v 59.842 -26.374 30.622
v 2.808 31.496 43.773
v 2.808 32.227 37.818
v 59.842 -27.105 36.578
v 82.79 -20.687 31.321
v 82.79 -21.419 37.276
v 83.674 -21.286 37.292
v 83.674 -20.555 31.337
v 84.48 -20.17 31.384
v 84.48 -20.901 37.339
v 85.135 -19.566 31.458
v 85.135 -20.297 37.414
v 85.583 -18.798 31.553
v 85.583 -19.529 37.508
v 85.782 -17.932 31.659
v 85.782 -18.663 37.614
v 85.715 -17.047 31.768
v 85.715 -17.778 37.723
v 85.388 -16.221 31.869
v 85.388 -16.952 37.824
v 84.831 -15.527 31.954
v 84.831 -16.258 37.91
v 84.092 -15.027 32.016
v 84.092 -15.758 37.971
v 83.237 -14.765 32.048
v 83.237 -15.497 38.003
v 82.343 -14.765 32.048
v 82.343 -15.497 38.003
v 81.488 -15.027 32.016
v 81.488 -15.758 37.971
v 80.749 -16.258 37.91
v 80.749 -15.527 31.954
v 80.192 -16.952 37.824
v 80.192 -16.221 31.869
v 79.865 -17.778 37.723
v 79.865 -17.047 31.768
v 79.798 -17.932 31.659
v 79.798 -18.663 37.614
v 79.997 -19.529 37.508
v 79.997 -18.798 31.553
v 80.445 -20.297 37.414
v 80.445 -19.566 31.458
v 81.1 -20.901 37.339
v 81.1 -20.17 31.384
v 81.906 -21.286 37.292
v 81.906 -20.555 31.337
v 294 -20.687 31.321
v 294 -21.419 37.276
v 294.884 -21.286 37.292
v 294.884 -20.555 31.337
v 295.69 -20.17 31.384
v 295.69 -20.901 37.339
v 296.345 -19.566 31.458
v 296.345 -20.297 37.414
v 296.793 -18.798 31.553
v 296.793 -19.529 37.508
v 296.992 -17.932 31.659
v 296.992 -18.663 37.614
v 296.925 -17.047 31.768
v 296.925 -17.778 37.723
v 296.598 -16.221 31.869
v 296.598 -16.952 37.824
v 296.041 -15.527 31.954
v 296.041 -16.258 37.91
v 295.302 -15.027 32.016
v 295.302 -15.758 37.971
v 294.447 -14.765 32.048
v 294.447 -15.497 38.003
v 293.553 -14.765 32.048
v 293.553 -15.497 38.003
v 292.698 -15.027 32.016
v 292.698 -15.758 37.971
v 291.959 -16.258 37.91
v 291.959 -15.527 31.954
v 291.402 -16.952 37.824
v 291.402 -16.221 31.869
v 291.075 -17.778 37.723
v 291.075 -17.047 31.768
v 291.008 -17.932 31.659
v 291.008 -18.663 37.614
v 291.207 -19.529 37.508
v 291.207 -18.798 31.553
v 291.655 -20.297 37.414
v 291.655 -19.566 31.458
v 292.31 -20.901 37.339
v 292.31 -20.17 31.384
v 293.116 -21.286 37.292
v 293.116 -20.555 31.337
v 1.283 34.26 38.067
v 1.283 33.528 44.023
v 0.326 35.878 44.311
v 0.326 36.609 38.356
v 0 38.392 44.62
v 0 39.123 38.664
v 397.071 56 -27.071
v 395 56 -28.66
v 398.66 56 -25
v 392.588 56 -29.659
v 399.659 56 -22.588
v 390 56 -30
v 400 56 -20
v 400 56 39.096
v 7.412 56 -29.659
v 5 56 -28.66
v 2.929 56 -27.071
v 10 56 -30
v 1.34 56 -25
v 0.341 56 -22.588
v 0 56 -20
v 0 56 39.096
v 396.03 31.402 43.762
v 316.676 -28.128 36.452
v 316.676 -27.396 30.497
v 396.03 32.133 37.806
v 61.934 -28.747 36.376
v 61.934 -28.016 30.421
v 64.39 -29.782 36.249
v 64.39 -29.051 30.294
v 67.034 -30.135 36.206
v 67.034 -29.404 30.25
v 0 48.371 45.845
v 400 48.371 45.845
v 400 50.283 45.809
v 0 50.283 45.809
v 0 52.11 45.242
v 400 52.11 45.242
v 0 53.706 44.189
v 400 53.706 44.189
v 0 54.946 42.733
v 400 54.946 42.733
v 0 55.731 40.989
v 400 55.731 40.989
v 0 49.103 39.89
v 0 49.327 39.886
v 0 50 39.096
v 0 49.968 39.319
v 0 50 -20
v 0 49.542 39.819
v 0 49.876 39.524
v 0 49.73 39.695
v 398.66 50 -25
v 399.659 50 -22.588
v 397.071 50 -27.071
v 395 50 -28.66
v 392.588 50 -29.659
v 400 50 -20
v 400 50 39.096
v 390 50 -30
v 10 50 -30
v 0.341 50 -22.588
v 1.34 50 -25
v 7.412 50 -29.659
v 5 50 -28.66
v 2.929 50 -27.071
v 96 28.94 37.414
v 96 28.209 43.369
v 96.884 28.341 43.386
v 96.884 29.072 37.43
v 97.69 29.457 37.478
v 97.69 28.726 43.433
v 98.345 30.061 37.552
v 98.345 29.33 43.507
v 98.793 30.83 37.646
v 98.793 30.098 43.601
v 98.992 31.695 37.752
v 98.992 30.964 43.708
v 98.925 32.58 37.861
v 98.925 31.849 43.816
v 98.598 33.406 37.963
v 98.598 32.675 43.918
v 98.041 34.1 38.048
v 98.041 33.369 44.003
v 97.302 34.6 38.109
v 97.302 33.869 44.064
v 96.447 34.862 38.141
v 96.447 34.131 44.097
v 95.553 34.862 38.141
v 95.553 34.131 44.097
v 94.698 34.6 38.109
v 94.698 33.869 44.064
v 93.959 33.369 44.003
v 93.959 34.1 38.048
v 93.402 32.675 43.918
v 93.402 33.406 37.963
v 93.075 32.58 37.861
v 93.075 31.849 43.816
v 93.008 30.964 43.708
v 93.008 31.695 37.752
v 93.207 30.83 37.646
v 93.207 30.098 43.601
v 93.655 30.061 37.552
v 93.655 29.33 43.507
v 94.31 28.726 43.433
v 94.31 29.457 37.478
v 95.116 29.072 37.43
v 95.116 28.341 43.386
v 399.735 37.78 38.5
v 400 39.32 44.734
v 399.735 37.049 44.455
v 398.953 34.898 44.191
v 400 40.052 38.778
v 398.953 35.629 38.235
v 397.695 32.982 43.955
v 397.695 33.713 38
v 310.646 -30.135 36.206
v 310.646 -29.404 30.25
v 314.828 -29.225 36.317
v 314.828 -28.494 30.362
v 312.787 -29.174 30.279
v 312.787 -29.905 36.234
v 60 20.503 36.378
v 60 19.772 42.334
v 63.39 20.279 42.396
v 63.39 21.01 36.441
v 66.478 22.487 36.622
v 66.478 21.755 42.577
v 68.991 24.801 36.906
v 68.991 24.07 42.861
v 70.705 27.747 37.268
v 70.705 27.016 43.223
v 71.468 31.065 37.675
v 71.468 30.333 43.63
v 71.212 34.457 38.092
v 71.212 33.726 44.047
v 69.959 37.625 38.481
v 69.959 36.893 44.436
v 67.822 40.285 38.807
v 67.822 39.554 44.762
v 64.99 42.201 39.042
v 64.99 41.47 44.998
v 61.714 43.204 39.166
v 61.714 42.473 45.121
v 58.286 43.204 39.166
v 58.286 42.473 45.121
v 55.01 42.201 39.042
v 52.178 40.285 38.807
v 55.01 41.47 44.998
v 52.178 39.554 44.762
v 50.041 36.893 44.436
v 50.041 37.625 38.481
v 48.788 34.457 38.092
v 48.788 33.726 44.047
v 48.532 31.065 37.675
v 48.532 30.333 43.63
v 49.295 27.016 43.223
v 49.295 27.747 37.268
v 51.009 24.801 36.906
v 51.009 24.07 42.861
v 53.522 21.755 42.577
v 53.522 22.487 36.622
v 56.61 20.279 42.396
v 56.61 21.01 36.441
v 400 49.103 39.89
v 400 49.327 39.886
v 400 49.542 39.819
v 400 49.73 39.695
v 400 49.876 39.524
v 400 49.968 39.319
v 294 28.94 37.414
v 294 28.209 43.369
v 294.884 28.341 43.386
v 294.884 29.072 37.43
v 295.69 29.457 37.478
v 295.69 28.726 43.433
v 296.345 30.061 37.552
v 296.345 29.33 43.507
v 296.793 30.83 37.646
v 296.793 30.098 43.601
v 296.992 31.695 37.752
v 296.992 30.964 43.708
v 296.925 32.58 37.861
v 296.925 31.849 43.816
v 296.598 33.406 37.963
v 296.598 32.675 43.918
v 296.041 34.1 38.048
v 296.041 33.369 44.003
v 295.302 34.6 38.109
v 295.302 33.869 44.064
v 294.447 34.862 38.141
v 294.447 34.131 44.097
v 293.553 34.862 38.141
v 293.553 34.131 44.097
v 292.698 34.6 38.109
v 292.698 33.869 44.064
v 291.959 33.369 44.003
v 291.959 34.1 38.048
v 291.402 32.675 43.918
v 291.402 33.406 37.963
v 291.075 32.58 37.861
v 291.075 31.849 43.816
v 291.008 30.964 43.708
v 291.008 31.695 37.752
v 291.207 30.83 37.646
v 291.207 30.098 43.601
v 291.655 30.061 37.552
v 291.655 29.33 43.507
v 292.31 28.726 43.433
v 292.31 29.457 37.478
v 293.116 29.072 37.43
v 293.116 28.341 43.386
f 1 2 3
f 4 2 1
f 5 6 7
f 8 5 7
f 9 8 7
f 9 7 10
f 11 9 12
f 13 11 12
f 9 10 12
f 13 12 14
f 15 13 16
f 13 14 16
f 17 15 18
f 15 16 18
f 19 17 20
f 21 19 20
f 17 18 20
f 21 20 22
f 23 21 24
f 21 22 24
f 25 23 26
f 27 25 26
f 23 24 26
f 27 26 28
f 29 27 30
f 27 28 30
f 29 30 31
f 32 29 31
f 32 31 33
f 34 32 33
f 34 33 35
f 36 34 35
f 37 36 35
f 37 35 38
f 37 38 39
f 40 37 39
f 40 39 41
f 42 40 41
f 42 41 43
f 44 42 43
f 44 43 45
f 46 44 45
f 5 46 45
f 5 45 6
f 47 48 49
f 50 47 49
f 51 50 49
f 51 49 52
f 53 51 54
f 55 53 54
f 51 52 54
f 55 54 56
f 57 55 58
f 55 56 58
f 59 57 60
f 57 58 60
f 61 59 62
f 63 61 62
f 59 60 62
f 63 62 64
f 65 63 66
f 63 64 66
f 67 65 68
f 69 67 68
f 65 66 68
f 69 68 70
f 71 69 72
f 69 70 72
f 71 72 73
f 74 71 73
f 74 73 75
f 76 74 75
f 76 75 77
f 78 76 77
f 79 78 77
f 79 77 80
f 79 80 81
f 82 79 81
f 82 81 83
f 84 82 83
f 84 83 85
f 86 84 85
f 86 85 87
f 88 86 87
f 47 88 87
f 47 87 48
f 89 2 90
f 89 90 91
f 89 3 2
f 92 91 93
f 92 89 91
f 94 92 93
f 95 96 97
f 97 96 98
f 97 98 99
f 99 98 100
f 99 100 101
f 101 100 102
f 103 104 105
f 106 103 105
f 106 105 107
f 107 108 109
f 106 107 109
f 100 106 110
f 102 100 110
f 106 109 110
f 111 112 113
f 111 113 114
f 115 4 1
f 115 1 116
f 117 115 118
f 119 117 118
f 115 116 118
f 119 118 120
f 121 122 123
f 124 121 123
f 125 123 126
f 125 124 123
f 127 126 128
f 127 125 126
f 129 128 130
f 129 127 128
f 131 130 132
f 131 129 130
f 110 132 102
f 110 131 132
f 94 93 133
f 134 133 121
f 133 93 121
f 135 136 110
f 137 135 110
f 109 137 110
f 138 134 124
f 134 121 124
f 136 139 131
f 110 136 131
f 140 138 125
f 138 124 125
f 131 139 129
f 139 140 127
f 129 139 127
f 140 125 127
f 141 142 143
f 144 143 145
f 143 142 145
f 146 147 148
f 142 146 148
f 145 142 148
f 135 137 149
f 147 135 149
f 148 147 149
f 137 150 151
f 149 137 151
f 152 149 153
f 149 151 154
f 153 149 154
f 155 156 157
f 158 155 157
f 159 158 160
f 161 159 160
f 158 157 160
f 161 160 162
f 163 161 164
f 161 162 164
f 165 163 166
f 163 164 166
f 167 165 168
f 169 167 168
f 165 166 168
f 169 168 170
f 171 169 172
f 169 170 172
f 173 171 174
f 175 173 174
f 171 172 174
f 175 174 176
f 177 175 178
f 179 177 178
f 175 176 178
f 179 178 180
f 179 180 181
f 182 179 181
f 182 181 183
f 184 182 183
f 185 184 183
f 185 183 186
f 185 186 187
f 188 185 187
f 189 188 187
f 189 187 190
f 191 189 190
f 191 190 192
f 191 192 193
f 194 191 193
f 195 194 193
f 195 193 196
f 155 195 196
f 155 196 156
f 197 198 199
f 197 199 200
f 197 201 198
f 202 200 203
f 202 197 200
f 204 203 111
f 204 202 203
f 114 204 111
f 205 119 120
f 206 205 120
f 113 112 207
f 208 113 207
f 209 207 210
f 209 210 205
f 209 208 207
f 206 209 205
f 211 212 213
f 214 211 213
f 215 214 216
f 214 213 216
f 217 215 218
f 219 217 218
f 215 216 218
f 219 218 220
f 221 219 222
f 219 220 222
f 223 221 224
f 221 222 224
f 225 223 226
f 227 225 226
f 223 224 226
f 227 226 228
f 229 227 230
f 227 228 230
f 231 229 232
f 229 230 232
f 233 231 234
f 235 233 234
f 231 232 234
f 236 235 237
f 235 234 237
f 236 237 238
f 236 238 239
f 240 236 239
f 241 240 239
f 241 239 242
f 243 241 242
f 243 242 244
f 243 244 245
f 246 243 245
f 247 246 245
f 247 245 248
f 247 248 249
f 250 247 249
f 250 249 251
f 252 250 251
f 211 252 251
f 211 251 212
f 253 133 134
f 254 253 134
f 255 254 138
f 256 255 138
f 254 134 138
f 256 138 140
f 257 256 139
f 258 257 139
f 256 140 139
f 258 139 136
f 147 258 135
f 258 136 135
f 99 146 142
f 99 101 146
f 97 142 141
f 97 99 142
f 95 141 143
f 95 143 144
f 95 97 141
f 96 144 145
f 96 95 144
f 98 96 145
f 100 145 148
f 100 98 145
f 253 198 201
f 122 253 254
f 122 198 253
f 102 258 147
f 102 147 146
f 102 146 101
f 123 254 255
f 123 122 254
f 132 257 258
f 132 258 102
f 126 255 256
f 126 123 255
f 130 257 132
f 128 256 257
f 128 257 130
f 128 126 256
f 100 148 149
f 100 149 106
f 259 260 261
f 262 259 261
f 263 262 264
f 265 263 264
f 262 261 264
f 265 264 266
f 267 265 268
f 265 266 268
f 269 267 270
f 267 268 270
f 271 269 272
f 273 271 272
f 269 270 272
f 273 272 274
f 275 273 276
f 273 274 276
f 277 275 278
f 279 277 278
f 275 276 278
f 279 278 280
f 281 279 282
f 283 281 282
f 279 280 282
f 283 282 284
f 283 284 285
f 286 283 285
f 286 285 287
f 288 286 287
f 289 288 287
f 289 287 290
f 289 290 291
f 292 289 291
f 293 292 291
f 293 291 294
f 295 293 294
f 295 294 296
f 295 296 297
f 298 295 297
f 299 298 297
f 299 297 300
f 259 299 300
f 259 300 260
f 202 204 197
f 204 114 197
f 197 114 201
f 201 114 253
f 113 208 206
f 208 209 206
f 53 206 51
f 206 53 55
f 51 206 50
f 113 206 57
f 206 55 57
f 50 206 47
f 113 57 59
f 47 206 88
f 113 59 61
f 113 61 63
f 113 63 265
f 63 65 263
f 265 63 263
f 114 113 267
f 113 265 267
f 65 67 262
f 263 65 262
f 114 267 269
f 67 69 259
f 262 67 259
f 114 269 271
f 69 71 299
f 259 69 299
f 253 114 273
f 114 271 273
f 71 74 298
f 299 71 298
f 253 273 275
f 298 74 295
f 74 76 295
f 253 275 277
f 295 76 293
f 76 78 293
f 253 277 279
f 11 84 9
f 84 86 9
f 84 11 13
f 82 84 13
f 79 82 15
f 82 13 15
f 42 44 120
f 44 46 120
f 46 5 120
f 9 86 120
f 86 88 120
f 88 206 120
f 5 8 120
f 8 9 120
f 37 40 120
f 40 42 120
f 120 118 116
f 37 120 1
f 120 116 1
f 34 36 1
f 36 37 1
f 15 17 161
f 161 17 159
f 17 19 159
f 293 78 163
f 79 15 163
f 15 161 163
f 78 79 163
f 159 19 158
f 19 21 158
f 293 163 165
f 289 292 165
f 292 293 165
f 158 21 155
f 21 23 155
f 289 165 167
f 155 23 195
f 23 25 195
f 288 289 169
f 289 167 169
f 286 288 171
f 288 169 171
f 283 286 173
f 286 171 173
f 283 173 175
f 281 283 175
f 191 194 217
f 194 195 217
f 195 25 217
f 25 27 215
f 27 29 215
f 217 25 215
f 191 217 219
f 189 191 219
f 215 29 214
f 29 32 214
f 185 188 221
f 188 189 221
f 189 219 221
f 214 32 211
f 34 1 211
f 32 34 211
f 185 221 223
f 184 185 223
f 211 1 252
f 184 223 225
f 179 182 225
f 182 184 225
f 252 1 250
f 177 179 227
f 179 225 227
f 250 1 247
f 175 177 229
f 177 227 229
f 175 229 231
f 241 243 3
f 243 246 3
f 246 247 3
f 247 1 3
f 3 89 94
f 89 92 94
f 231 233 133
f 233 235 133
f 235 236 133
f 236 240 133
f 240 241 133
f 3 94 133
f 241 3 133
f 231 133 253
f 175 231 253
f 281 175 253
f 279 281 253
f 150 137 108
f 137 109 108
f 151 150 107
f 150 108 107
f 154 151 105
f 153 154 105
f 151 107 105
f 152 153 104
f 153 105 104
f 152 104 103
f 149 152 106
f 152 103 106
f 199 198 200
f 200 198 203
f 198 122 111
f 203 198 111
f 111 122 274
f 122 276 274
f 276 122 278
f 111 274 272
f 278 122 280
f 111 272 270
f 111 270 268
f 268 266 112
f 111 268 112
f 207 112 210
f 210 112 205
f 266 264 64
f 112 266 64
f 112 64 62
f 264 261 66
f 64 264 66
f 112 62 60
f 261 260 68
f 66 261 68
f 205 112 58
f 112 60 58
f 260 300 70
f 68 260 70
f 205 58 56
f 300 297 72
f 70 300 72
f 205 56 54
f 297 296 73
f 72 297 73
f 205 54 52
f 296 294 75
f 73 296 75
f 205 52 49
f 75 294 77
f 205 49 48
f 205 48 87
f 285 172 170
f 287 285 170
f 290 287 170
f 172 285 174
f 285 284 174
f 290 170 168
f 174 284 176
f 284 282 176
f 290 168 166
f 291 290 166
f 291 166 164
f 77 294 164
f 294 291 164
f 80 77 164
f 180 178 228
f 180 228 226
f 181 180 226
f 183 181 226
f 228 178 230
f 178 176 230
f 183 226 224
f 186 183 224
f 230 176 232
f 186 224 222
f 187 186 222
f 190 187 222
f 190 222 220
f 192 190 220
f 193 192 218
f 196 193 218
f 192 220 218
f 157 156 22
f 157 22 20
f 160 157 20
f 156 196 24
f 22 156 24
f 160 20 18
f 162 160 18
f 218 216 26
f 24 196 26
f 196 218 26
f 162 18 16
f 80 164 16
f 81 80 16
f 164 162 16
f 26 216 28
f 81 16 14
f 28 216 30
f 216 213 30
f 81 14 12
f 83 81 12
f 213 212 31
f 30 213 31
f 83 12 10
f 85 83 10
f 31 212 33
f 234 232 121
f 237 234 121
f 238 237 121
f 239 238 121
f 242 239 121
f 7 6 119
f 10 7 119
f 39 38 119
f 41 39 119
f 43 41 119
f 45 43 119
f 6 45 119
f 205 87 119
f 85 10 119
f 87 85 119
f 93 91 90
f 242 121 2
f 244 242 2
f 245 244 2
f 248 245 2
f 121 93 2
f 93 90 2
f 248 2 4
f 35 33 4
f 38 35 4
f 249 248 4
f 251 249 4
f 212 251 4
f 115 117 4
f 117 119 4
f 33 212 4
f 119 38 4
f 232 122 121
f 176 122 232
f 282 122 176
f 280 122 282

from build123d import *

# Parameters (mm, degrees)
BOSS_EXTRUDE1_DEPTH    = 400
SKETCH2_R              = 3
SKETCH2_R_2            = 11.5
CUT_EXTRUDE1_DEPTH     = 10
CUT_EXTRUDE2_DEPTH     = 411.492681542
FILLET1_R              = 10
FILLET2_R              = 10
CONVERT_SOLID1_DEPTH   = 400
CONVERT_SOLID1_2_DEPTH = 400


# Read off the part's stored shape, not the designer's step: Convert-Solid1
with BuildPart() as part:
    # Sketch1 → Boss-Extrude1 (new body)
    with BuildSketch(Plane(origin=(0, 0, 0), x_dir=(0, 0, -1), z_dir=(1, 0, 0))):
        Polygon((-30.250452528, -29.403692131), (-40, 50), (30, 50), (30, 56), (-46.781766318, 56), (-36.205729437, -30.134908192), align=None)
    extrude(amount=BOSS_EXTRUDE1_DEPTH)

    # Sketch2 → Cut-Extrude1 (cut)
    with BuildSketch(Plane(origin=(0, -4.827047129, 39.313144045), x_dir=(1, 0, 0), z_dir=(0, -0.12186934340515194, 0.9925461516413215))):
        with Locations(Location((96, 36.283847636, 0), (0, 0, 270))):
            Circle(SKETCH2_R)
        with Locations(Location((294, 36.283847636, 0), (0, 0, 270))):
            Circle(SKETCH2_R)
        with Locations(Location((294, -13.716152364, 0), (0, 0, 270))):
            Circle(SKETCH2_R)
        with Locations(Location((60, 36.283847636, 0), (0, 0, 270))):
            Circle(SKETCH2_R_2)
        with Locations(Location((82.79, -13.716152364, 0), (0, 0, 270))):
            Circle(SKETCH2_R)
    extrude(amount=-CUT_EXTRUDE1_DEPTH, mode=Mode.SUBTRACT)

    # Sketch3 → Cut-Extrude2 (cut, through all)
    with BuildSketch(Plane(origin=(0, -4.827047129, 39.313144045), x_dir=(1, 0, 0), z_dir=(0, -0.12186934340515194, 0.9925461516413215))):
        Polygon((314, -25.497918682), (400, 39.502081318), (421.348881307, 33.662382961), (421.69701633, -53.203923072), (314, -56.960779507), align=None)
        Polygon((-35.970836278, 39.502081318), (0, 39.502081318), (62.79, -25.497918682), (64.049370498, -44.831722112), (-31.822947487, -47.152069291), align=None)
    extrude(amount=-CUT_EXTRUDE2_DEPTH, mode=Mode.SUBTRACT)

    # Fillet1
    fillet1_edges = [part.edges().sort_by_distance(p)[0] for p in [
        (400, 34.746199695, 41.149598304),
        (314, -29.769300162, 33.228090983),
        (0, 34.746199695, 41.149598304),
        (62.79, -29.769300162, 33.228090983),
    ]]
    fillet(fillet1_edges, radius=FILLET1_R)

    # Fillet2
    fillet2_edges = [part.edges().sort_by_distance(p)[0] for p in [
        (400, 53, -30),
        (0, 53, -30),
    ]]
    fillet(fillet2_edges, radius=FILLET2_R)

    # Convert-Solid1 outline → Convert-Solid1 (cut)
    with BuildSketch(Plane.YZ):
        with BuildLine():
            ThreePointArc((48.371288465, 45.845078322), (53.705816328, 44.188663392), (56, 39.095764491))
            Line((56, 39.095764491), (56, 46.781766318))
            Line((56, 46.781766318), (48.371288465, 45.845078322))
        make_face()
    extrude(amount=CONVERT_SOLID1_DEPTH, mode=Mode.SUBTRACT)

    # Convert-Solid1 2 outline → Convert-Solid1 2 (add)
    with BuildSketch(Plane.YZ):
        with BuildLine():
            ThreePointArc((49.102504525, 39.889801412), (49.730096039, 39.694929068), (50, 39.095764491))
            Line((50, 39.095764491), (50, 40))
            Line((50, 40), (49.102504525, 39.889801412))
        make_face()
    extrude(amount=CONVERT_SOLID1_2_DEPTH)


solid = part.part
